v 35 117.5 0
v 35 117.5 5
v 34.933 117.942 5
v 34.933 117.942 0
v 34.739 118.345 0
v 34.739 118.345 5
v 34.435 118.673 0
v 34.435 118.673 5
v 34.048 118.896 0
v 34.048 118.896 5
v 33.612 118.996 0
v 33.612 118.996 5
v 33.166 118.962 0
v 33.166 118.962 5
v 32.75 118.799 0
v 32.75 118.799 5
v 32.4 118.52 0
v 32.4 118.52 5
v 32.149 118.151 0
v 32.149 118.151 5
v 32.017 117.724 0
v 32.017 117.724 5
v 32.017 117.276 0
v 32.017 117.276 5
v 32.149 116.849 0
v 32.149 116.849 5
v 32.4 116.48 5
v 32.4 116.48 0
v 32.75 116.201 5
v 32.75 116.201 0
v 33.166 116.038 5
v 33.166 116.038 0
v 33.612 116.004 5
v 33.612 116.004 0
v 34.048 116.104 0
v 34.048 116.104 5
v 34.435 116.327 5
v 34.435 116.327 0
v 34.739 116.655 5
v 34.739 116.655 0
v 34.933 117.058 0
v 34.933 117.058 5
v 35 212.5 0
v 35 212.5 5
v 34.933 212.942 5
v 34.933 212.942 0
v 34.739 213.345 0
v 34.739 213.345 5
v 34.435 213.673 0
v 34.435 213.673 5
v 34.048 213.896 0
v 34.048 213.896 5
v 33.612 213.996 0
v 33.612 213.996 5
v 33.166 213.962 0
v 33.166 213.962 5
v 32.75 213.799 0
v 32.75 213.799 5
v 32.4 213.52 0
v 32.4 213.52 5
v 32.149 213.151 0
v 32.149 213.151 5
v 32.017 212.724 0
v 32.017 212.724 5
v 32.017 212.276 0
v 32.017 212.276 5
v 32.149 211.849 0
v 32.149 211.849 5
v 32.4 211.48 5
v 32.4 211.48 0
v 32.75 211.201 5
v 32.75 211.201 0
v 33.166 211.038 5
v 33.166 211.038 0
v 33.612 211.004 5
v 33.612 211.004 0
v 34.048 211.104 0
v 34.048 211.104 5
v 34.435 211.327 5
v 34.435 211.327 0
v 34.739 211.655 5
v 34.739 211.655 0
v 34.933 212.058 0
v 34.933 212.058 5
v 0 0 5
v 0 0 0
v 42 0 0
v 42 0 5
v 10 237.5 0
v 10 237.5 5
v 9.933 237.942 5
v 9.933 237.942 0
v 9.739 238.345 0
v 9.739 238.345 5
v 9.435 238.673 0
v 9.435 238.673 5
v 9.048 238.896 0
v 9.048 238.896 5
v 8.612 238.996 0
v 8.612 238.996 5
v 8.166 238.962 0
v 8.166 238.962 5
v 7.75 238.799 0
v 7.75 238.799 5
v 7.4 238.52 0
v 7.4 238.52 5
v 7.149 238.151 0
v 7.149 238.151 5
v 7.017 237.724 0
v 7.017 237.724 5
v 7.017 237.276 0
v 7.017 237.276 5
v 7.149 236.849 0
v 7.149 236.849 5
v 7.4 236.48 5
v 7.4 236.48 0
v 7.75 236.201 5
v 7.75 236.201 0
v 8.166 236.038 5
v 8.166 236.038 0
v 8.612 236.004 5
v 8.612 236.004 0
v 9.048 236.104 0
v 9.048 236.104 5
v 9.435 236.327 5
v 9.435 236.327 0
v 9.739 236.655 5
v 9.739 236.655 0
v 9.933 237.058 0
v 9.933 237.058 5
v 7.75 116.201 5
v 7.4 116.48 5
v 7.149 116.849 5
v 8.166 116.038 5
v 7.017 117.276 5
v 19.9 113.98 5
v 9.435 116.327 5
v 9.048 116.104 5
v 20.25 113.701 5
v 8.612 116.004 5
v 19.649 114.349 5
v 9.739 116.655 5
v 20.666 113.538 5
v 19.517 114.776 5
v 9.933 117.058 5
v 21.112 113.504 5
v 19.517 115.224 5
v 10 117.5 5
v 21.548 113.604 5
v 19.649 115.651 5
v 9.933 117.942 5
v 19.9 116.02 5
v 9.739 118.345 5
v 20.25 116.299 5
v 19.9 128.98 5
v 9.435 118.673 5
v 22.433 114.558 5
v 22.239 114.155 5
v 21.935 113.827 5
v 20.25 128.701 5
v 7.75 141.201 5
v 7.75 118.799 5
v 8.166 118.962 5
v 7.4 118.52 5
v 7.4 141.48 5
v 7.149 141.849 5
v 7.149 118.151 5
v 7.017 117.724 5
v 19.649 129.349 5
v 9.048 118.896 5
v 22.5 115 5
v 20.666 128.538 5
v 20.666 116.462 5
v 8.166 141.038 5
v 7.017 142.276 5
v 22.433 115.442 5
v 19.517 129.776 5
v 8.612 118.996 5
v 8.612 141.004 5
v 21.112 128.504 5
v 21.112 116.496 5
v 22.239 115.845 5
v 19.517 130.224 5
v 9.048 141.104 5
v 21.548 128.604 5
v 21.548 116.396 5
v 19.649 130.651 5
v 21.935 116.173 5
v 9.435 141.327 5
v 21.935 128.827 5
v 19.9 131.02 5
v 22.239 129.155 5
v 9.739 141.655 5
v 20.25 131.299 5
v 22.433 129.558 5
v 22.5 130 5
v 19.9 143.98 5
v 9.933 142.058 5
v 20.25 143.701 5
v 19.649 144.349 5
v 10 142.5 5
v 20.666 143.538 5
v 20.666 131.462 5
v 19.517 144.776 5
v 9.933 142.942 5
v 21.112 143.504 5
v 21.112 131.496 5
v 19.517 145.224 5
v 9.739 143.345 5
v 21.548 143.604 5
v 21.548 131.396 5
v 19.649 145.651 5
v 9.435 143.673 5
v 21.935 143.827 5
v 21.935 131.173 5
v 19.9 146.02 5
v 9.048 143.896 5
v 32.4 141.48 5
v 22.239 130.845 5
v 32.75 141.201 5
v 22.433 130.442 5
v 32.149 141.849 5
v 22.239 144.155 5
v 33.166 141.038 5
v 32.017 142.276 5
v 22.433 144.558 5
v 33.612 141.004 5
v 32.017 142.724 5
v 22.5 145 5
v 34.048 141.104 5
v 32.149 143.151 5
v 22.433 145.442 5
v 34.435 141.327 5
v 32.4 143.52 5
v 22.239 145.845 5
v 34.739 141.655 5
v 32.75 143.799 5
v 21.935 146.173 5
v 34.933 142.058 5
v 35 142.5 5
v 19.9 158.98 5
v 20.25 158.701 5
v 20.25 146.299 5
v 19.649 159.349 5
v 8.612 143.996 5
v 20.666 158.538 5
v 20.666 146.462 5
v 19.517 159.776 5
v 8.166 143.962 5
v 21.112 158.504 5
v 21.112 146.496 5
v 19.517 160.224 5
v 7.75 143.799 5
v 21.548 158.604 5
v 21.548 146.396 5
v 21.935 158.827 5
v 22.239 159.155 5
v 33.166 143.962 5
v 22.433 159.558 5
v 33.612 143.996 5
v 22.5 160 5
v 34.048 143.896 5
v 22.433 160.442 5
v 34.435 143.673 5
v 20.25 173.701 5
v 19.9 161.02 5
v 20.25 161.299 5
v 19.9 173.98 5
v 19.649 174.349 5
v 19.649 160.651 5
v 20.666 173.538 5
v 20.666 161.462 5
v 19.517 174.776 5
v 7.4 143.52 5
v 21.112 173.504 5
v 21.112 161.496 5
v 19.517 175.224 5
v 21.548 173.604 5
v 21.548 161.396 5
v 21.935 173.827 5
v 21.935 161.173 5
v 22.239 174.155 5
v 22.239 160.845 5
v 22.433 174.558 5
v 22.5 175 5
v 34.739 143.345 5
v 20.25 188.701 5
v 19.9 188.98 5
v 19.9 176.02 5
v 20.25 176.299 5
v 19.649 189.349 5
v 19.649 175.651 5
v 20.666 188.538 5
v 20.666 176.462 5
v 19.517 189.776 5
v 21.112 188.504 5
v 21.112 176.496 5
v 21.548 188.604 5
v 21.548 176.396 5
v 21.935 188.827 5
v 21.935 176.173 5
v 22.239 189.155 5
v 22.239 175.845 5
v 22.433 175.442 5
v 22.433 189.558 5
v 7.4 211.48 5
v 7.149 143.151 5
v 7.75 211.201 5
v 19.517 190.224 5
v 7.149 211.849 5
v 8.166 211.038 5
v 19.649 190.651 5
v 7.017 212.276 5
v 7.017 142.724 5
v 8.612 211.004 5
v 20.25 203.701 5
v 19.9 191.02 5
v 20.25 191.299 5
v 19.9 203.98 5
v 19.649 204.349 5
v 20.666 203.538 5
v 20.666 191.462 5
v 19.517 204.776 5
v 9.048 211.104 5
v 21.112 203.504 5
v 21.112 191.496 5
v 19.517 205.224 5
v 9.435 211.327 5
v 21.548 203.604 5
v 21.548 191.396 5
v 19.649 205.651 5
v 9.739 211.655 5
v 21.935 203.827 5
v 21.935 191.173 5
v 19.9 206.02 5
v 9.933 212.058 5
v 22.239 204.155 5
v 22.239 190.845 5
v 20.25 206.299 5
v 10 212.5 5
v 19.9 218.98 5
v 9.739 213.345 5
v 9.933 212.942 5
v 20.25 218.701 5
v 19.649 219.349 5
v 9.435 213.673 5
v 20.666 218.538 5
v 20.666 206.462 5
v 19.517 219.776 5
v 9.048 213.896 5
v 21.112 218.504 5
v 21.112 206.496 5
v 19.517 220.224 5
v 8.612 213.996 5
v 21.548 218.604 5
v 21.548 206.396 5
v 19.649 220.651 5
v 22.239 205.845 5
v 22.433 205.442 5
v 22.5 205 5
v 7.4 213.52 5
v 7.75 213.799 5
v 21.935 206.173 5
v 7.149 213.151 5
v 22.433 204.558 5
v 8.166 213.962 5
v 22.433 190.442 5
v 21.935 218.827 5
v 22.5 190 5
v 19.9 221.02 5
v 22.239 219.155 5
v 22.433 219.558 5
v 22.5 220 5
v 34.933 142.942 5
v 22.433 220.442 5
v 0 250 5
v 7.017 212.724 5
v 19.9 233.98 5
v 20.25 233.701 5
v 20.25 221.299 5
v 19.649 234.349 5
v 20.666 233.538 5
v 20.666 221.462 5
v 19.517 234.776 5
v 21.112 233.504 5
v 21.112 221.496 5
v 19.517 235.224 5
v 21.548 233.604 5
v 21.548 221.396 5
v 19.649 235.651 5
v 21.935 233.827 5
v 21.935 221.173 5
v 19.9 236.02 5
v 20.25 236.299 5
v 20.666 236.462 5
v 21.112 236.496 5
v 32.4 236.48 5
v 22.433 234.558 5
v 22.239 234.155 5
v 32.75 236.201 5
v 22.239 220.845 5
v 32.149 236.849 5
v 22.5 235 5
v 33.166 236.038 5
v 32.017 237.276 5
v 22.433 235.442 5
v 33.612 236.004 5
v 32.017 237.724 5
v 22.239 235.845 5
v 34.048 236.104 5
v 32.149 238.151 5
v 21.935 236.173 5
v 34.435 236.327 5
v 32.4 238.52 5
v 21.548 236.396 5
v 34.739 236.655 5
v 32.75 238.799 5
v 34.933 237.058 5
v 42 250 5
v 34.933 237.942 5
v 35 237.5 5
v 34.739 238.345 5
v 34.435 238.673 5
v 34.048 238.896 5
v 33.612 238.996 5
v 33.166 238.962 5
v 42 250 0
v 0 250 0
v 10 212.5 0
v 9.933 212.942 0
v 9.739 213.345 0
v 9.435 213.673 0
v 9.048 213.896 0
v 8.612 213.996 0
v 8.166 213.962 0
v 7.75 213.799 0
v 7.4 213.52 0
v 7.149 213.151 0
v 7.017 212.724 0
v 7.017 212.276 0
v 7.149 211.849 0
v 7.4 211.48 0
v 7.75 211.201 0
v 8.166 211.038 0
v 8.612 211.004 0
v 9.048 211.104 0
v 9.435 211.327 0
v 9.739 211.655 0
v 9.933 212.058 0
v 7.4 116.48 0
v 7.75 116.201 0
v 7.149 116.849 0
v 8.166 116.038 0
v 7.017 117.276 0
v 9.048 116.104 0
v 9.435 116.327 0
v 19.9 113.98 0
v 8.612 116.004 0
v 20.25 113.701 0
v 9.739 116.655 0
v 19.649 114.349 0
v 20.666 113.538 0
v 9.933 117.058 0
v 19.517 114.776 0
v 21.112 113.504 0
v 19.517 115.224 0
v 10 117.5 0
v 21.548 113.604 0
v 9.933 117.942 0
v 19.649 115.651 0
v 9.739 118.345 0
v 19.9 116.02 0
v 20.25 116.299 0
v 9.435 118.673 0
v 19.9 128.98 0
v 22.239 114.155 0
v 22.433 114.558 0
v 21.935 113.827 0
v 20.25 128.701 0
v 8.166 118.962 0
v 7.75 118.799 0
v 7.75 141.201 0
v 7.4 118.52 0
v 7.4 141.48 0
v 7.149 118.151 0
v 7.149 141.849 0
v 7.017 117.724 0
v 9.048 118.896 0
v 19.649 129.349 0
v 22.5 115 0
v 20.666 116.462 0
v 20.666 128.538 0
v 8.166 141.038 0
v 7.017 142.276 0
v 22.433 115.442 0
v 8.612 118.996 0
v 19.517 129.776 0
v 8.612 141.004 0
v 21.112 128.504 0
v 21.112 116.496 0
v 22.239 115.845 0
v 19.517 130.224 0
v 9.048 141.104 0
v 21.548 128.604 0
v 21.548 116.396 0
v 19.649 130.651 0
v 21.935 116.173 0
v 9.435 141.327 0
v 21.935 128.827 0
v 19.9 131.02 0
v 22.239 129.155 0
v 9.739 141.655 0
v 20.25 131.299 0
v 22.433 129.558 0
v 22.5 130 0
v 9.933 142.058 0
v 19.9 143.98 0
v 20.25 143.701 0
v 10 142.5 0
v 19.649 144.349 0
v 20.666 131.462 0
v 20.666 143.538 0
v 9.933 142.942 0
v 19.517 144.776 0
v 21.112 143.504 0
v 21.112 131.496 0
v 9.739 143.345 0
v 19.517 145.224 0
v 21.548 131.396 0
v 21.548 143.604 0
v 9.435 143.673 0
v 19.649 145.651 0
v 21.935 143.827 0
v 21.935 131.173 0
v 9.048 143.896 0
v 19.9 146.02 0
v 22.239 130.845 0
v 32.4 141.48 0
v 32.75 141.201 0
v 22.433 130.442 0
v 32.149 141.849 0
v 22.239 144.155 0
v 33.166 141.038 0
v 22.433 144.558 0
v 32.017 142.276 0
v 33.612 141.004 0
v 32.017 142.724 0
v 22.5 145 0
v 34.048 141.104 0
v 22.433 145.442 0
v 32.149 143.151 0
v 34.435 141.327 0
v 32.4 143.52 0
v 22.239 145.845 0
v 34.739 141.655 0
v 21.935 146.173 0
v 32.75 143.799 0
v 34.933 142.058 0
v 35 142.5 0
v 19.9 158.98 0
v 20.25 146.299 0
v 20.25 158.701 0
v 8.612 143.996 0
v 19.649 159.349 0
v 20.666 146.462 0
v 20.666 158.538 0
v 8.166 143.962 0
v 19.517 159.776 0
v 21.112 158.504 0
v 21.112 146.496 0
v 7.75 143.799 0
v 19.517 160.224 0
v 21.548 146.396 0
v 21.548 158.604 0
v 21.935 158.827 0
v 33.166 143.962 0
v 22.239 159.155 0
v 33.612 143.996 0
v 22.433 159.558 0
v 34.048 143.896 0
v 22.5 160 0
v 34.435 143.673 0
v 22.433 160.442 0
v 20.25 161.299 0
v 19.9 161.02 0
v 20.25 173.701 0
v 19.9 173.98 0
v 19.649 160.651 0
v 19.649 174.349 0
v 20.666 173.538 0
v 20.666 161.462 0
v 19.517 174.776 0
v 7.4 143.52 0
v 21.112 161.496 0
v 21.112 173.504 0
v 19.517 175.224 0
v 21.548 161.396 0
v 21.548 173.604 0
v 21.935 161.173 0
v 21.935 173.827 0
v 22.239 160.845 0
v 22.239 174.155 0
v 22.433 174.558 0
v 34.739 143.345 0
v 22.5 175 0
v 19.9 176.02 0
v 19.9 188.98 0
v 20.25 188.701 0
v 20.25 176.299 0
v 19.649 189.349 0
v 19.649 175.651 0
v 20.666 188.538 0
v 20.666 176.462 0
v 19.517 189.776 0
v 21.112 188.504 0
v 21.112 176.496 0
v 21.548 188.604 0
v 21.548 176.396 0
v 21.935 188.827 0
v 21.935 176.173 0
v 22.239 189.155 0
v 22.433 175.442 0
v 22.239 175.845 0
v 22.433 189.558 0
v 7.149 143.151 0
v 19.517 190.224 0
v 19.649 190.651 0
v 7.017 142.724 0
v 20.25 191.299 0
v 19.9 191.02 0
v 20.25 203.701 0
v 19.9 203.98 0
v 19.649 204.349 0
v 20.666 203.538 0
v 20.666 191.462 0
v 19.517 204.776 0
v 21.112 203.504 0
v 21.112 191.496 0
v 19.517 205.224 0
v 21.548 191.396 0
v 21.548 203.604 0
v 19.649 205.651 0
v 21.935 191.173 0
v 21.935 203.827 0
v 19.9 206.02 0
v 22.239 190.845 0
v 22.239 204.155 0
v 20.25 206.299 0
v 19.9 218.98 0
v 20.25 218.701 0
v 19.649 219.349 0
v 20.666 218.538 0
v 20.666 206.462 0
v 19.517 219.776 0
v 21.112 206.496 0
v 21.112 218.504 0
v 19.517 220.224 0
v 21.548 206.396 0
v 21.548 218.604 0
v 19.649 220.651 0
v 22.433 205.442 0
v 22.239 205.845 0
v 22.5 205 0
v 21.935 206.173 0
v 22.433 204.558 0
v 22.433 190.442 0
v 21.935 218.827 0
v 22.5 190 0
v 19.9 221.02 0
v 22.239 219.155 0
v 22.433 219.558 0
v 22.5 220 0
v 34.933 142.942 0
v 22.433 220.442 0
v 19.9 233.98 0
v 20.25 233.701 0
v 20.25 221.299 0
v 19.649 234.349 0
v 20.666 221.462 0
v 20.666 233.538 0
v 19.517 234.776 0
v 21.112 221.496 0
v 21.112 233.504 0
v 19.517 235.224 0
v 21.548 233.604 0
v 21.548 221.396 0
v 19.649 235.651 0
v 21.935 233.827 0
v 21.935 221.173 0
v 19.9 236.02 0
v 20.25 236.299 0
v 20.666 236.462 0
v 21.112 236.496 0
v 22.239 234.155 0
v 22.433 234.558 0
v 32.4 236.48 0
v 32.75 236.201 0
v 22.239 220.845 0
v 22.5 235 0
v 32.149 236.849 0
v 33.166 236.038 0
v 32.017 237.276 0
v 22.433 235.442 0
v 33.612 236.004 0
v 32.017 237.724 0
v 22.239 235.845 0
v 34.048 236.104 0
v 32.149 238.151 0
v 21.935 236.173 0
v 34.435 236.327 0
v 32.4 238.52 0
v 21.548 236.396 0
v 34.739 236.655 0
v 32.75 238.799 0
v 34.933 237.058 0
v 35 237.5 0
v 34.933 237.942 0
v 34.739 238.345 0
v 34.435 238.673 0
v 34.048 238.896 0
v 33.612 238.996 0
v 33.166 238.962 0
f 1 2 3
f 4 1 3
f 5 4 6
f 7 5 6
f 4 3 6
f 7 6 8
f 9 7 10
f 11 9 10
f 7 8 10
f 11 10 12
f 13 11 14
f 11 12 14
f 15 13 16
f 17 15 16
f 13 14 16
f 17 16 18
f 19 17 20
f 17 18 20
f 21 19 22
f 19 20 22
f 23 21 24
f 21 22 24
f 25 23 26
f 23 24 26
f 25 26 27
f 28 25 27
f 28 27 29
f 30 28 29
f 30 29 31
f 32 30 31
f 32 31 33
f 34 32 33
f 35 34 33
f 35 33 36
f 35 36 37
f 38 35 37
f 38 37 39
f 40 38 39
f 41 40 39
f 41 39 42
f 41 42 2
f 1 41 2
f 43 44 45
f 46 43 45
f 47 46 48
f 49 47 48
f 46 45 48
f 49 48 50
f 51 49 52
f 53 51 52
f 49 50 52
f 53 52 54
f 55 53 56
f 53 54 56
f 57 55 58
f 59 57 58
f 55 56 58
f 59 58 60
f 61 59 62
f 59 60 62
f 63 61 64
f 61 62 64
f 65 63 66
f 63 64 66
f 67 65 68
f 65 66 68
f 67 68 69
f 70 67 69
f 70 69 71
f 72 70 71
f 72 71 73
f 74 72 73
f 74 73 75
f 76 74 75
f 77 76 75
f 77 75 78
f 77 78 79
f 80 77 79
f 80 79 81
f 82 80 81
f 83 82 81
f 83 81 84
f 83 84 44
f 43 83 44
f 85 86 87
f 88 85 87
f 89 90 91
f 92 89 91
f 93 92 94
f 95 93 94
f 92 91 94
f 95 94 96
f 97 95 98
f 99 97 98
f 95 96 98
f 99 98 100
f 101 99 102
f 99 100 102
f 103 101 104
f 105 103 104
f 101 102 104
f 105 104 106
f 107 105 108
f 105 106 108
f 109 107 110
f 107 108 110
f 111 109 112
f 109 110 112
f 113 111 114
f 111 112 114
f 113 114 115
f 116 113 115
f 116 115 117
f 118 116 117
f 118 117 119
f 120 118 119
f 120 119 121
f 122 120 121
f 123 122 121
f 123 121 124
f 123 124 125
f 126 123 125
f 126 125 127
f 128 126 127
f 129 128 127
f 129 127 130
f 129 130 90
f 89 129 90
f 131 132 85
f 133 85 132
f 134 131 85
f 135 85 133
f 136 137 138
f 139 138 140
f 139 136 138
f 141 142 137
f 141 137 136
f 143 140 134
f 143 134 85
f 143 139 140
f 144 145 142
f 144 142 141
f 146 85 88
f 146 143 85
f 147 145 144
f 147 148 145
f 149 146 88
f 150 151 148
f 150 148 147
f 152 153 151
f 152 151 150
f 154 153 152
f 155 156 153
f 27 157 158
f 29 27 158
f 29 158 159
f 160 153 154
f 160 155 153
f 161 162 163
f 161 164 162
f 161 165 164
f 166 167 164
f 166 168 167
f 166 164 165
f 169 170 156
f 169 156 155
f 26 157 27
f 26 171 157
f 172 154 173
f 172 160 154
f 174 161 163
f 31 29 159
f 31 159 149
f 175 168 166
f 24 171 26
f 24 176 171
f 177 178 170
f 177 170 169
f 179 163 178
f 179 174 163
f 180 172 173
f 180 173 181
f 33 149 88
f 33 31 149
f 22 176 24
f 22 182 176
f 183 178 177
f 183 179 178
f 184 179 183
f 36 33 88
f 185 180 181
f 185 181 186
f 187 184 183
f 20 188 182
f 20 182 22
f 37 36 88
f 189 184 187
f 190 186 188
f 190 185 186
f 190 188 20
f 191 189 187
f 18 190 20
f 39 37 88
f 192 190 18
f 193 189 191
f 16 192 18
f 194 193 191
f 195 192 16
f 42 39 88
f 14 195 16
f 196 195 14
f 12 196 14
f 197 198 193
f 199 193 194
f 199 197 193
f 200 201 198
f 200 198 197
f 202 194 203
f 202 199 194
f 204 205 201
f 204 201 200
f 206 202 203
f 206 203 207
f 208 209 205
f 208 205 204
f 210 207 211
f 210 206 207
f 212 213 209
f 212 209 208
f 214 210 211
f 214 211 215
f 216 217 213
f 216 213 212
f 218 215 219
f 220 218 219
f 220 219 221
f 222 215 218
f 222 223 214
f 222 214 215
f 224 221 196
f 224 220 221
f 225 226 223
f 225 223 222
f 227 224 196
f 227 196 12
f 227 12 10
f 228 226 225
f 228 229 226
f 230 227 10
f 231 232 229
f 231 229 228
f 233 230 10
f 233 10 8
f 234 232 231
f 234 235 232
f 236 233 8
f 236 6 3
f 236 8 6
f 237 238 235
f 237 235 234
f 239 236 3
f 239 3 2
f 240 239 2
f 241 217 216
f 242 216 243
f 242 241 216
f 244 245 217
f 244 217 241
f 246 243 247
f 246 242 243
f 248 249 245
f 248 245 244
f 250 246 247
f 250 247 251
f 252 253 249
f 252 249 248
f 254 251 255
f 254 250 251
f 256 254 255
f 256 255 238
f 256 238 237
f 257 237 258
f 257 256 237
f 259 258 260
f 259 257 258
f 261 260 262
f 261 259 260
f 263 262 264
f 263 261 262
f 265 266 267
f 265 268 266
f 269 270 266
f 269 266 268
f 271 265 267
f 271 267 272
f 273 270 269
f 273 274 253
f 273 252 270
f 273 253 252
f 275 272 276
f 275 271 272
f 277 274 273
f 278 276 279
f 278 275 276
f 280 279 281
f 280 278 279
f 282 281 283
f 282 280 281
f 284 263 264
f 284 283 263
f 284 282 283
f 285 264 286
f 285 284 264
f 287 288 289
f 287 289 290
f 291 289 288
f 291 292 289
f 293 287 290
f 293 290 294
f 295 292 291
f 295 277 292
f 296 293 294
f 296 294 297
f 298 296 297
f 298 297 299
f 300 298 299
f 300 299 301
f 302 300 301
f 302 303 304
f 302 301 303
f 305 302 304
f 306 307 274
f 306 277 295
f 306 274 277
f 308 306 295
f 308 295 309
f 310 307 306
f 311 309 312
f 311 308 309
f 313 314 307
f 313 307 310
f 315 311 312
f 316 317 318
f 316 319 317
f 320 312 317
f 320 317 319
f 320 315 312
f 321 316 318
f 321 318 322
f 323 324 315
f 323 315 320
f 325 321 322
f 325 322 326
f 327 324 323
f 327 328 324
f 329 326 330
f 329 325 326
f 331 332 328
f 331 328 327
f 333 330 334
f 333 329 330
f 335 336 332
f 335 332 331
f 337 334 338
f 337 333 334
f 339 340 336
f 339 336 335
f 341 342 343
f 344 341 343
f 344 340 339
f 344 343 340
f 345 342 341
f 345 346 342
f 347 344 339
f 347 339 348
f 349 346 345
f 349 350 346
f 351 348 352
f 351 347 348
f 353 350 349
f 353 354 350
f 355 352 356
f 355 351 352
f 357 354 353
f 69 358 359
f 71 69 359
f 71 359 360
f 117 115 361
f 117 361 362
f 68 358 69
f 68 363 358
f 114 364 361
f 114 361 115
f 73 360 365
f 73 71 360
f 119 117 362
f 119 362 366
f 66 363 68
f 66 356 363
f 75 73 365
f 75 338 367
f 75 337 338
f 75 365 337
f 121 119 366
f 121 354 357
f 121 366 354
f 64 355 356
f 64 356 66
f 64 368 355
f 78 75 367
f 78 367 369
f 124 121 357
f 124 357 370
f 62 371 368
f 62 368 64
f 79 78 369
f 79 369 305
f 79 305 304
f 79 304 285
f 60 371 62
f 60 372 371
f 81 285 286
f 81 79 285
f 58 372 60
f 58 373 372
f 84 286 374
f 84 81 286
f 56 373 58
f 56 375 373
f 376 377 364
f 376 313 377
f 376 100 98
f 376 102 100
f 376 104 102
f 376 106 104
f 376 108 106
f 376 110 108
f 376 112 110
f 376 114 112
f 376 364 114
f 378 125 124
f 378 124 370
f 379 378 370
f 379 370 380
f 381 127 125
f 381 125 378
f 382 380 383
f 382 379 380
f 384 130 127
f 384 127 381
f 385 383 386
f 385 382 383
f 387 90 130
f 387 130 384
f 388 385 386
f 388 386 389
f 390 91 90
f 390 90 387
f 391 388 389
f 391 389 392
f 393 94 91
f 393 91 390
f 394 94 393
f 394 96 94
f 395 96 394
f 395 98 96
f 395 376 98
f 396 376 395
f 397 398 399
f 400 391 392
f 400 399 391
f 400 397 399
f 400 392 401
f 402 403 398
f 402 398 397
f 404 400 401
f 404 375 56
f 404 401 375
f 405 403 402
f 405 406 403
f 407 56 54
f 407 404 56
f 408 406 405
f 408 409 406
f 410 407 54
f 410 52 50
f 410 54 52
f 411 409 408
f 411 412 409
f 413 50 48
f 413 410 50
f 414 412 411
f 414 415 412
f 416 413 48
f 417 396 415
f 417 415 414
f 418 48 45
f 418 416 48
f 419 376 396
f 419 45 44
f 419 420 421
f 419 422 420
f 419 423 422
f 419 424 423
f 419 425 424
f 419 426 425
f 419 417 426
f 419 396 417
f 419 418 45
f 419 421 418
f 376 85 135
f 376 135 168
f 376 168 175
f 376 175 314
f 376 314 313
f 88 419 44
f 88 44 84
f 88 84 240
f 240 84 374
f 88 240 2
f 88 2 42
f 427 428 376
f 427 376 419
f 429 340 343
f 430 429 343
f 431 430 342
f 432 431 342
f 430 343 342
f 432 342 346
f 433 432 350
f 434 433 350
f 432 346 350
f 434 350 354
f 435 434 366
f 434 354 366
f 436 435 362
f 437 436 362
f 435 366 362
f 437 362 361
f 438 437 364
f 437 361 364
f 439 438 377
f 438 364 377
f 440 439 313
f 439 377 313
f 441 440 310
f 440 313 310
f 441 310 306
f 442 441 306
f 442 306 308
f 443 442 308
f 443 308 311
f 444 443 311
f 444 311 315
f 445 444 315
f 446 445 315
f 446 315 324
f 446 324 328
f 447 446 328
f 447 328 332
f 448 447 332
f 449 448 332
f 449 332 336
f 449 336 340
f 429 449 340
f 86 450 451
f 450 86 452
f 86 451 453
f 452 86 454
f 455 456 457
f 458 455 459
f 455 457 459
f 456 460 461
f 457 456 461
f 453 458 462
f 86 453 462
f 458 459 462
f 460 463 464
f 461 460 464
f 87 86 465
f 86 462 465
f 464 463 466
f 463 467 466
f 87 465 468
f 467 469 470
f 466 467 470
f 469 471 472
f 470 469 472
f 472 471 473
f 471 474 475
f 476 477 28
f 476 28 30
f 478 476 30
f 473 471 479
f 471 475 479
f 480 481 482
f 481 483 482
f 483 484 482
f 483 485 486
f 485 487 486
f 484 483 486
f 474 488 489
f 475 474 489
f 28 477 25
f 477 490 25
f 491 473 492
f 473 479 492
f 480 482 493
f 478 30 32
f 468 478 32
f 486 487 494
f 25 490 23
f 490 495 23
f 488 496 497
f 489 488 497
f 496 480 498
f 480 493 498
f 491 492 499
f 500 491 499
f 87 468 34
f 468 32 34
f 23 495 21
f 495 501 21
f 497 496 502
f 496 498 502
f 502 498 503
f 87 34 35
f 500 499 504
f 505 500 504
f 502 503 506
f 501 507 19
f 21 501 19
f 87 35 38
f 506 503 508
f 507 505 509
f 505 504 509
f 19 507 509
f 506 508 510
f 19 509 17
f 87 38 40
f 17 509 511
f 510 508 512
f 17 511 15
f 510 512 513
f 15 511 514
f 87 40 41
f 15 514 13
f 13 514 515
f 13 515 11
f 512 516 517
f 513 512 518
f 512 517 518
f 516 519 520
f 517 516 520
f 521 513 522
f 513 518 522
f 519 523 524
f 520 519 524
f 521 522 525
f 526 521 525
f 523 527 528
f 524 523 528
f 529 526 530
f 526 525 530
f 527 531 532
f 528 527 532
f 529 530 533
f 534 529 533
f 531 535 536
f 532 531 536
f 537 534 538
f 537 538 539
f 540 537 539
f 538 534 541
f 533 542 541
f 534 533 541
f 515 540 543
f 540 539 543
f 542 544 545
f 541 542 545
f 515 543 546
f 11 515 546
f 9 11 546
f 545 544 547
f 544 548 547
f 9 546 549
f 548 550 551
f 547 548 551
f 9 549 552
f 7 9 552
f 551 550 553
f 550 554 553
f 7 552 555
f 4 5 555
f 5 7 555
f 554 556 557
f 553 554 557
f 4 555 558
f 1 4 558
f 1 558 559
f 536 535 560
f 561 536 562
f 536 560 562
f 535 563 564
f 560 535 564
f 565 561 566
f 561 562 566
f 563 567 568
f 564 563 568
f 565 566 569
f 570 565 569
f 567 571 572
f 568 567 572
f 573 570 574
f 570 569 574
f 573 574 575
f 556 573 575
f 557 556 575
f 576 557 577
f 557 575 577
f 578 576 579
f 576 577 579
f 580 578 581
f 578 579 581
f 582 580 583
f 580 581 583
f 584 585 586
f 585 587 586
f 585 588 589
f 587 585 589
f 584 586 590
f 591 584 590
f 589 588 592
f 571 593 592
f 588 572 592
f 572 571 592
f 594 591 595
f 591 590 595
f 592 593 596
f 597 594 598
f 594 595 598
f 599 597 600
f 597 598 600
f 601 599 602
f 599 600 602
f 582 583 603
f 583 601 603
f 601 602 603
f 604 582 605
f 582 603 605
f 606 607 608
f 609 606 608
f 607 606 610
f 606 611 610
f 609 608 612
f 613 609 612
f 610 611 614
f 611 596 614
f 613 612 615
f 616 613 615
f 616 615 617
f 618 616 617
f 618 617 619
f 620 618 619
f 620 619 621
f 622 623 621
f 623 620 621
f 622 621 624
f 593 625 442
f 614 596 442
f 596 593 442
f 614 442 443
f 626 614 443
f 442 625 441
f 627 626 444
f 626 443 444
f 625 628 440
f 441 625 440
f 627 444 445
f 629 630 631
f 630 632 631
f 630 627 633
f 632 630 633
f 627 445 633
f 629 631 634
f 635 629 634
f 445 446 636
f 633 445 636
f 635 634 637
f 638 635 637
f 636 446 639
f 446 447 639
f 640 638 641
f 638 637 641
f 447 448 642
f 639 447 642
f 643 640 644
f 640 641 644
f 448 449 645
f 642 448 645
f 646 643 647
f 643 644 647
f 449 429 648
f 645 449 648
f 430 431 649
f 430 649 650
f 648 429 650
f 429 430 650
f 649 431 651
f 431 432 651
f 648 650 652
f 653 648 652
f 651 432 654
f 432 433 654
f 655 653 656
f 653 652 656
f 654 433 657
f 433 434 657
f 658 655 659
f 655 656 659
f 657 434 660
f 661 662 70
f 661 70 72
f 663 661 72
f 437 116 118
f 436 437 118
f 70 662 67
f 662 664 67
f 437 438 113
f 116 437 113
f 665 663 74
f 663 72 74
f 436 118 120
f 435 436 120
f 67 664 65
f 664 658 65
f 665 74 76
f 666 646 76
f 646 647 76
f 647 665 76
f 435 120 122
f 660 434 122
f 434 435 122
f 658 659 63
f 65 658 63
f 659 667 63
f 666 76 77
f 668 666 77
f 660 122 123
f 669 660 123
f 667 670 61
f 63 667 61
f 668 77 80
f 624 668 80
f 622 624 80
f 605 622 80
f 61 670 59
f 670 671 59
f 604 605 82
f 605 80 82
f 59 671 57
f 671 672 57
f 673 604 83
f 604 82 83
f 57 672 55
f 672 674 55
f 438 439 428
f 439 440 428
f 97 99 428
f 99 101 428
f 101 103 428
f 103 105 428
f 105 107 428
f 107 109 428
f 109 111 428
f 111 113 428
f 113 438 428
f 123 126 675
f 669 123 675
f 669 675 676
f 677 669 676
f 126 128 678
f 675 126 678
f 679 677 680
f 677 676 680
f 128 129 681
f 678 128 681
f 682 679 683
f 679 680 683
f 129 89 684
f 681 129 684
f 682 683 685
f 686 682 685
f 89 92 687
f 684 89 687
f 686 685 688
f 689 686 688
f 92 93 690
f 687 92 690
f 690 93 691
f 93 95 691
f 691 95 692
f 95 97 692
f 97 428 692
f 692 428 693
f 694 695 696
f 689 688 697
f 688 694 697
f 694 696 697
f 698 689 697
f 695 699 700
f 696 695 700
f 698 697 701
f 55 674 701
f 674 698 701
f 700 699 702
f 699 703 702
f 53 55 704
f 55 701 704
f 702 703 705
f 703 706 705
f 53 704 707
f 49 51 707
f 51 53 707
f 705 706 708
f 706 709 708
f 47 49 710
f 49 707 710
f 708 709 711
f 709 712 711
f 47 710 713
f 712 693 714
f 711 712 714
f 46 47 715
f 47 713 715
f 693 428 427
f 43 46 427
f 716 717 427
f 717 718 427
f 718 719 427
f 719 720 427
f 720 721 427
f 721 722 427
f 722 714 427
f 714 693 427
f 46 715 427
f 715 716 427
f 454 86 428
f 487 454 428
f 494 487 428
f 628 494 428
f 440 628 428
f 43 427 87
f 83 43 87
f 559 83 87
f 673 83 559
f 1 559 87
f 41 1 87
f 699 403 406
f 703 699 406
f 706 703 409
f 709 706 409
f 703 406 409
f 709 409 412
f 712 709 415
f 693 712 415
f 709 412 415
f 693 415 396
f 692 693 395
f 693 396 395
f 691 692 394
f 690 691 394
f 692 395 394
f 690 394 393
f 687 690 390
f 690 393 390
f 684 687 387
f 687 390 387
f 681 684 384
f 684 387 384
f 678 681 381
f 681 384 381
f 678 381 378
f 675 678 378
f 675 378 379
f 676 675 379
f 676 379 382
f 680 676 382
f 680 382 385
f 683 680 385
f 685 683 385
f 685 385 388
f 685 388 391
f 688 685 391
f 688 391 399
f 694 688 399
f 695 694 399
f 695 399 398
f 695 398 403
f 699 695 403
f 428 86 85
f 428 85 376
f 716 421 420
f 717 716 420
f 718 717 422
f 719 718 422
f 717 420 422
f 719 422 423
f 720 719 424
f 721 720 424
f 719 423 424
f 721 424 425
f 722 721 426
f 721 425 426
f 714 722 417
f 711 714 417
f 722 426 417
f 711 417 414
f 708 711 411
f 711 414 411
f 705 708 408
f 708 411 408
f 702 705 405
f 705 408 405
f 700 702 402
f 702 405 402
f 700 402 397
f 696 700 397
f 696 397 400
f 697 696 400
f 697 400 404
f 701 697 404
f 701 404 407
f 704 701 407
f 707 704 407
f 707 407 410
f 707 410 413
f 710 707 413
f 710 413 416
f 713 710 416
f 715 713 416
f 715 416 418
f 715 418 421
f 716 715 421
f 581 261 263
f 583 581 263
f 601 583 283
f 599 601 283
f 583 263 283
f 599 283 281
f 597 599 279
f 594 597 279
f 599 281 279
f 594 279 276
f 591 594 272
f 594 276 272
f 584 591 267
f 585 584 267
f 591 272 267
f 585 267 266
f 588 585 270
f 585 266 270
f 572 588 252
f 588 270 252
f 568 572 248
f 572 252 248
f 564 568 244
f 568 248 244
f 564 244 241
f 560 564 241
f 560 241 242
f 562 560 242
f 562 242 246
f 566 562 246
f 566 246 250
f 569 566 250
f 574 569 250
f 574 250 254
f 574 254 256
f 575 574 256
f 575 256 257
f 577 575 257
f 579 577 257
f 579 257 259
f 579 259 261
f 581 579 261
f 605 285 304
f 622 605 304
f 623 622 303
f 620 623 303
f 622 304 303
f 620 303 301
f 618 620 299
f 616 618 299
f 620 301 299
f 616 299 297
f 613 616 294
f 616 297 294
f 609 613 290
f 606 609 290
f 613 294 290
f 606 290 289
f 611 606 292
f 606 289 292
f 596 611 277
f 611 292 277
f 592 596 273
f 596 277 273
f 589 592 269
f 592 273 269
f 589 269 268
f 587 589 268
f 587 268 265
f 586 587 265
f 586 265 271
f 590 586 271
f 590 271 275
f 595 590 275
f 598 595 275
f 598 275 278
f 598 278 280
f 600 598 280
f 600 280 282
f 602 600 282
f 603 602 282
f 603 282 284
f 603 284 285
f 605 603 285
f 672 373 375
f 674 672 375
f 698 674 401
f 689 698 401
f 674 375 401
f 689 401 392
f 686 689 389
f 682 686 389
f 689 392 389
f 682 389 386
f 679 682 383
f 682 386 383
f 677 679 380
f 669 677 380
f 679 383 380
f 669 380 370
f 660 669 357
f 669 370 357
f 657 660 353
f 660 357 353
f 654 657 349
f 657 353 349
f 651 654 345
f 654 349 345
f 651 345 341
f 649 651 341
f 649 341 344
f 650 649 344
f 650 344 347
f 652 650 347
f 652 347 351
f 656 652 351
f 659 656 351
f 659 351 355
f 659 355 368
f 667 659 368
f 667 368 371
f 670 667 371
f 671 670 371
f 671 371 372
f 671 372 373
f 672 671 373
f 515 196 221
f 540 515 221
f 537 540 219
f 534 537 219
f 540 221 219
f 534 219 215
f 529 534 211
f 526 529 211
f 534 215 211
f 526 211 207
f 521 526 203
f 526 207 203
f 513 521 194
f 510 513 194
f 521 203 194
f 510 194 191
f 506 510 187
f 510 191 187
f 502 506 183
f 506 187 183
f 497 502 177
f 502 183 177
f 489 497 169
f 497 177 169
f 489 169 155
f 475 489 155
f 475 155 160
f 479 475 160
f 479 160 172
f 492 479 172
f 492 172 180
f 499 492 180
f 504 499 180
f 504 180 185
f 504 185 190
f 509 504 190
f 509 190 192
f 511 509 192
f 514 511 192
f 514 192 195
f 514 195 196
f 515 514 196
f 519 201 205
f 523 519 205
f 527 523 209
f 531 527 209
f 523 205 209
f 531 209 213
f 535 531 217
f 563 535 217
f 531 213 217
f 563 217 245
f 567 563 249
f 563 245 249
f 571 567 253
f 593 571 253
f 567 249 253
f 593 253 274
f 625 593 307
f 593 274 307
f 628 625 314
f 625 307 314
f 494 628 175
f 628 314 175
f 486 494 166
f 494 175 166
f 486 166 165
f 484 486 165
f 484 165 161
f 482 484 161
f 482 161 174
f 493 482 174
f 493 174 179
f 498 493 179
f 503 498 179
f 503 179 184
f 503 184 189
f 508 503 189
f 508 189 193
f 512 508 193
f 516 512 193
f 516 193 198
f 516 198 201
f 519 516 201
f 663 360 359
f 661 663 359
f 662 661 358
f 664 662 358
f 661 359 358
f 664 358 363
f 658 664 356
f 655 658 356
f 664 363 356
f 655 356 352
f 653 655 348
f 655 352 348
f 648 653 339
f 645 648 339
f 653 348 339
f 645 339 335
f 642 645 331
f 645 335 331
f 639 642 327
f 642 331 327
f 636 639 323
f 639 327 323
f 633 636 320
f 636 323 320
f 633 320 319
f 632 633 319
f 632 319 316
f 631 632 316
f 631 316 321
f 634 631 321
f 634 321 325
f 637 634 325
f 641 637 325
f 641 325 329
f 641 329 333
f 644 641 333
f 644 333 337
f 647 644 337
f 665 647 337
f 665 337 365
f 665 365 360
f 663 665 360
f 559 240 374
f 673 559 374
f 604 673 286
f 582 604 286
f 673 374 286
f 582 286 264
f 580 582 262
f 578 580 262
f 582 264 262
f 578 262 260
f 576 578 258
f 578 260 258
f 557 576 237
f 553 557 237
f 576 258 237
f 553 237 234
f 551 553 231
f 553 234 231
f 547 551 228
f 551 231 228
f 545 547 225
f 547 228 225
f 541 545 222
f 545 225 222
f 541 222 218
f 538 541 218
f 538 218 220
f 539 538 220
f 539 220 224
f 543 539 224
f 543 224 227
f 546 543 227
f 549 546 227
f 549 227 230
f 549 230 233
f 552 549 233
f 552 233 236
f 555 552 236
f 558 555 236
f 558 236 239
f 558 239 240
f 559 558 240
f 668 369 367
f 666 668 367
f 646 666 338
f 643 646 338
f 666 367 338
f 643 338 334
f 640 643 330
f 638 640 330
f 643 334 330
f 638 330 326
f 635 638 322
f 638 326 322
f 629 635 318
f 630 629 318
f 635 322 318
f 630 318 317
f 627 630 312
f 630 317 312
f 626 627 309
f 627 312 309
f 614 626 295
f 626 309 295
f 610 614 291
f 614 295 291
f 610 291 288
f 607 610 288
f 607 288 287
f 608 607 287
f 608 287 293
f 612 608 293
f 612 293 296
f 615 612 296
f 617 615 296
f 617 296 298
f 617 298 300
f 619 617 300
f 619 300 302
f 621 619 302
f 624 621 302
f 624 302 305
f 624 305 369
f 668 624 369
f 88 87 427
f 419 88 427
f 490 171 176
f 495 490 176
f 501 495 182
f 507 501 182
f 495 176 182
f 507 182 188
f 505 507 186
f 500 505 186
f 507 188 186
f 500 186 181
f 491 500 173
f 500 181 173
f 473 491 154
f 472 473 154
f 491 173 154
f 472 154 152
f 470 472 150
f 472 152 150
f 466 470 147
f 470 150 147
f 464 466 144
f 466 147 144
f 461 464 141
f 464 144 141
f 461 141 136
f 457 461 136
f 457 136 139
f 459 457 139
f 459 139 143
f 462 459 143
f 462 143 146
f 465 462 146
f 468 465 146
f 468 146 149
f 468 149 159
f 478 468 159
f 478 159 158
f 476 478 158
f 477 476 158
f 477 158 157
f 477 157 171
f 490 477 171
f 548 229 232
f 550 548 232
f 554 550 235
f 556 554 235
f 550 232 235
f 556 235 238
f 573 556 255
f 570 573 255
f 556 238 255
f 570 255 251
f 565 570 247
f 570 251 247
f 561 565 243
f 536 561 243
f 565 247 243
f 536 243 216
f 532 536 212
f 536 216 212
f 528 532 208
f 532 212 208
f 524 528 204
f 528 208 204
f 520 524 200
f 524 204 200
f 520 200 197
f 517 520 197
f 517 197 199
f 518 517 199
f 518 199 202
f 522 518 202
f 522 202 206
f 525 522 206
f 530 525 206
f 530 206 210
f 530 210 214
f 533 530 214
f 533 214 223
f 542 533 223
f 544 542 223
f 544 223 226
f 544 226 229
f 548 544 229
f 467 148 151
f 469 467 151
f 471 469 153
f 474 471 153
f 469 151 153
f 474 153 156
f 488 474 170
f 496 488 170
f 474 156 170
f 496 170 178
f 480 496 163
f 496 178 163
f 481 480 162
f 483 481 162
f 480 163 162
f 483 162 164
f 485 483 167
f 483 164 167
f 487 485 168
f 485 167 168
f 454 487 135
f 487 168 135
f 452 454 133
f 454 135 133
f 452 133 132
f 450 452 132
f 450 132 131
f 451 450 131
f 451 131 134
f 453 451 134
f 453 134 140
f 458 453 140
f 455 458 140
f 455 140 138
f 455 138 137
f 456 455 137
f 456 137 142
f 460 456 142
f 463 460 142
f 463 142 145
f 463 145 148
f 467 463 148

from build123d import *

# Parameters (mm, degrees)
SKETCH1_W           = 42
SKETCH1_H           = 250
BOSS_EXTRUDE1_DEPTH = 5
SKETCH2_R           = 1.5
CUT_EXTRUDE1_DEPTH  = 254.552755852


with BuildPart() as part:
    # Sketch1 → Boss-Extrude1 (new body)
    with BuildSketch(Plane.XY):
        with Locations((21, 125)):
            Rectangle(SKETCH1_W, SKETCH1_H)
    extrude(amount=BOSS_EXTRUDE1_DEPTH)

    # Sketch2 → Cut-Extrude1 (cut, through all)
    with BuildSketch(Plane.XY.offset(5)):
        with Locations((21, 235)):
            Circle(SKETCH2_R)
        with Locations((21, 220)):
            Circle(SKETCH2_R)
        with Locations((21, 205)):
            Circle(SKETCH2_R)
        with Locations((21, 190)):
            Circle(SKETCH2_R)
        with Locations((21, 175)):
            Circle(SKETCH2_R)
        with Locations((21, 160)):
            Circle(SKETCH2_R)
        with Locations((21, 145)):
            Circle(SKETCH2_R)
        with Locations((21, 130)):
            Circle(SKETCH2_R)
        with Locations((21, 115)):
            Circle(SKETCH2_R)
        with Locations((8.5, 237.5)):
            Circle(SKETCH2_R)
        with Locations((33.5, 237.5)):
            Circle(SKETCH2_R)
        with Locations((33.5, 212.5)):
            Circle(SKETCH2_R)
        with Locations((8.5, 212.5)):
            Circle(SKETCH2_R)
        with Locations((8.5, 142.5)):
            Circle(SKETCH2_R)
        with Locations((33.5, 142.5)):
            Circle(SKETCH2_R)
        with Locations((33.5, 117.5)):
            Circle(SKETCH2_R)
        with Locations((8.5, 117.5)):
            Circle(SKETCH2_R)
    extrude(amount=-CUT_EXTRUDE1_DEPTH, mode=Mode.SUBTRACT)


solid = part.part
